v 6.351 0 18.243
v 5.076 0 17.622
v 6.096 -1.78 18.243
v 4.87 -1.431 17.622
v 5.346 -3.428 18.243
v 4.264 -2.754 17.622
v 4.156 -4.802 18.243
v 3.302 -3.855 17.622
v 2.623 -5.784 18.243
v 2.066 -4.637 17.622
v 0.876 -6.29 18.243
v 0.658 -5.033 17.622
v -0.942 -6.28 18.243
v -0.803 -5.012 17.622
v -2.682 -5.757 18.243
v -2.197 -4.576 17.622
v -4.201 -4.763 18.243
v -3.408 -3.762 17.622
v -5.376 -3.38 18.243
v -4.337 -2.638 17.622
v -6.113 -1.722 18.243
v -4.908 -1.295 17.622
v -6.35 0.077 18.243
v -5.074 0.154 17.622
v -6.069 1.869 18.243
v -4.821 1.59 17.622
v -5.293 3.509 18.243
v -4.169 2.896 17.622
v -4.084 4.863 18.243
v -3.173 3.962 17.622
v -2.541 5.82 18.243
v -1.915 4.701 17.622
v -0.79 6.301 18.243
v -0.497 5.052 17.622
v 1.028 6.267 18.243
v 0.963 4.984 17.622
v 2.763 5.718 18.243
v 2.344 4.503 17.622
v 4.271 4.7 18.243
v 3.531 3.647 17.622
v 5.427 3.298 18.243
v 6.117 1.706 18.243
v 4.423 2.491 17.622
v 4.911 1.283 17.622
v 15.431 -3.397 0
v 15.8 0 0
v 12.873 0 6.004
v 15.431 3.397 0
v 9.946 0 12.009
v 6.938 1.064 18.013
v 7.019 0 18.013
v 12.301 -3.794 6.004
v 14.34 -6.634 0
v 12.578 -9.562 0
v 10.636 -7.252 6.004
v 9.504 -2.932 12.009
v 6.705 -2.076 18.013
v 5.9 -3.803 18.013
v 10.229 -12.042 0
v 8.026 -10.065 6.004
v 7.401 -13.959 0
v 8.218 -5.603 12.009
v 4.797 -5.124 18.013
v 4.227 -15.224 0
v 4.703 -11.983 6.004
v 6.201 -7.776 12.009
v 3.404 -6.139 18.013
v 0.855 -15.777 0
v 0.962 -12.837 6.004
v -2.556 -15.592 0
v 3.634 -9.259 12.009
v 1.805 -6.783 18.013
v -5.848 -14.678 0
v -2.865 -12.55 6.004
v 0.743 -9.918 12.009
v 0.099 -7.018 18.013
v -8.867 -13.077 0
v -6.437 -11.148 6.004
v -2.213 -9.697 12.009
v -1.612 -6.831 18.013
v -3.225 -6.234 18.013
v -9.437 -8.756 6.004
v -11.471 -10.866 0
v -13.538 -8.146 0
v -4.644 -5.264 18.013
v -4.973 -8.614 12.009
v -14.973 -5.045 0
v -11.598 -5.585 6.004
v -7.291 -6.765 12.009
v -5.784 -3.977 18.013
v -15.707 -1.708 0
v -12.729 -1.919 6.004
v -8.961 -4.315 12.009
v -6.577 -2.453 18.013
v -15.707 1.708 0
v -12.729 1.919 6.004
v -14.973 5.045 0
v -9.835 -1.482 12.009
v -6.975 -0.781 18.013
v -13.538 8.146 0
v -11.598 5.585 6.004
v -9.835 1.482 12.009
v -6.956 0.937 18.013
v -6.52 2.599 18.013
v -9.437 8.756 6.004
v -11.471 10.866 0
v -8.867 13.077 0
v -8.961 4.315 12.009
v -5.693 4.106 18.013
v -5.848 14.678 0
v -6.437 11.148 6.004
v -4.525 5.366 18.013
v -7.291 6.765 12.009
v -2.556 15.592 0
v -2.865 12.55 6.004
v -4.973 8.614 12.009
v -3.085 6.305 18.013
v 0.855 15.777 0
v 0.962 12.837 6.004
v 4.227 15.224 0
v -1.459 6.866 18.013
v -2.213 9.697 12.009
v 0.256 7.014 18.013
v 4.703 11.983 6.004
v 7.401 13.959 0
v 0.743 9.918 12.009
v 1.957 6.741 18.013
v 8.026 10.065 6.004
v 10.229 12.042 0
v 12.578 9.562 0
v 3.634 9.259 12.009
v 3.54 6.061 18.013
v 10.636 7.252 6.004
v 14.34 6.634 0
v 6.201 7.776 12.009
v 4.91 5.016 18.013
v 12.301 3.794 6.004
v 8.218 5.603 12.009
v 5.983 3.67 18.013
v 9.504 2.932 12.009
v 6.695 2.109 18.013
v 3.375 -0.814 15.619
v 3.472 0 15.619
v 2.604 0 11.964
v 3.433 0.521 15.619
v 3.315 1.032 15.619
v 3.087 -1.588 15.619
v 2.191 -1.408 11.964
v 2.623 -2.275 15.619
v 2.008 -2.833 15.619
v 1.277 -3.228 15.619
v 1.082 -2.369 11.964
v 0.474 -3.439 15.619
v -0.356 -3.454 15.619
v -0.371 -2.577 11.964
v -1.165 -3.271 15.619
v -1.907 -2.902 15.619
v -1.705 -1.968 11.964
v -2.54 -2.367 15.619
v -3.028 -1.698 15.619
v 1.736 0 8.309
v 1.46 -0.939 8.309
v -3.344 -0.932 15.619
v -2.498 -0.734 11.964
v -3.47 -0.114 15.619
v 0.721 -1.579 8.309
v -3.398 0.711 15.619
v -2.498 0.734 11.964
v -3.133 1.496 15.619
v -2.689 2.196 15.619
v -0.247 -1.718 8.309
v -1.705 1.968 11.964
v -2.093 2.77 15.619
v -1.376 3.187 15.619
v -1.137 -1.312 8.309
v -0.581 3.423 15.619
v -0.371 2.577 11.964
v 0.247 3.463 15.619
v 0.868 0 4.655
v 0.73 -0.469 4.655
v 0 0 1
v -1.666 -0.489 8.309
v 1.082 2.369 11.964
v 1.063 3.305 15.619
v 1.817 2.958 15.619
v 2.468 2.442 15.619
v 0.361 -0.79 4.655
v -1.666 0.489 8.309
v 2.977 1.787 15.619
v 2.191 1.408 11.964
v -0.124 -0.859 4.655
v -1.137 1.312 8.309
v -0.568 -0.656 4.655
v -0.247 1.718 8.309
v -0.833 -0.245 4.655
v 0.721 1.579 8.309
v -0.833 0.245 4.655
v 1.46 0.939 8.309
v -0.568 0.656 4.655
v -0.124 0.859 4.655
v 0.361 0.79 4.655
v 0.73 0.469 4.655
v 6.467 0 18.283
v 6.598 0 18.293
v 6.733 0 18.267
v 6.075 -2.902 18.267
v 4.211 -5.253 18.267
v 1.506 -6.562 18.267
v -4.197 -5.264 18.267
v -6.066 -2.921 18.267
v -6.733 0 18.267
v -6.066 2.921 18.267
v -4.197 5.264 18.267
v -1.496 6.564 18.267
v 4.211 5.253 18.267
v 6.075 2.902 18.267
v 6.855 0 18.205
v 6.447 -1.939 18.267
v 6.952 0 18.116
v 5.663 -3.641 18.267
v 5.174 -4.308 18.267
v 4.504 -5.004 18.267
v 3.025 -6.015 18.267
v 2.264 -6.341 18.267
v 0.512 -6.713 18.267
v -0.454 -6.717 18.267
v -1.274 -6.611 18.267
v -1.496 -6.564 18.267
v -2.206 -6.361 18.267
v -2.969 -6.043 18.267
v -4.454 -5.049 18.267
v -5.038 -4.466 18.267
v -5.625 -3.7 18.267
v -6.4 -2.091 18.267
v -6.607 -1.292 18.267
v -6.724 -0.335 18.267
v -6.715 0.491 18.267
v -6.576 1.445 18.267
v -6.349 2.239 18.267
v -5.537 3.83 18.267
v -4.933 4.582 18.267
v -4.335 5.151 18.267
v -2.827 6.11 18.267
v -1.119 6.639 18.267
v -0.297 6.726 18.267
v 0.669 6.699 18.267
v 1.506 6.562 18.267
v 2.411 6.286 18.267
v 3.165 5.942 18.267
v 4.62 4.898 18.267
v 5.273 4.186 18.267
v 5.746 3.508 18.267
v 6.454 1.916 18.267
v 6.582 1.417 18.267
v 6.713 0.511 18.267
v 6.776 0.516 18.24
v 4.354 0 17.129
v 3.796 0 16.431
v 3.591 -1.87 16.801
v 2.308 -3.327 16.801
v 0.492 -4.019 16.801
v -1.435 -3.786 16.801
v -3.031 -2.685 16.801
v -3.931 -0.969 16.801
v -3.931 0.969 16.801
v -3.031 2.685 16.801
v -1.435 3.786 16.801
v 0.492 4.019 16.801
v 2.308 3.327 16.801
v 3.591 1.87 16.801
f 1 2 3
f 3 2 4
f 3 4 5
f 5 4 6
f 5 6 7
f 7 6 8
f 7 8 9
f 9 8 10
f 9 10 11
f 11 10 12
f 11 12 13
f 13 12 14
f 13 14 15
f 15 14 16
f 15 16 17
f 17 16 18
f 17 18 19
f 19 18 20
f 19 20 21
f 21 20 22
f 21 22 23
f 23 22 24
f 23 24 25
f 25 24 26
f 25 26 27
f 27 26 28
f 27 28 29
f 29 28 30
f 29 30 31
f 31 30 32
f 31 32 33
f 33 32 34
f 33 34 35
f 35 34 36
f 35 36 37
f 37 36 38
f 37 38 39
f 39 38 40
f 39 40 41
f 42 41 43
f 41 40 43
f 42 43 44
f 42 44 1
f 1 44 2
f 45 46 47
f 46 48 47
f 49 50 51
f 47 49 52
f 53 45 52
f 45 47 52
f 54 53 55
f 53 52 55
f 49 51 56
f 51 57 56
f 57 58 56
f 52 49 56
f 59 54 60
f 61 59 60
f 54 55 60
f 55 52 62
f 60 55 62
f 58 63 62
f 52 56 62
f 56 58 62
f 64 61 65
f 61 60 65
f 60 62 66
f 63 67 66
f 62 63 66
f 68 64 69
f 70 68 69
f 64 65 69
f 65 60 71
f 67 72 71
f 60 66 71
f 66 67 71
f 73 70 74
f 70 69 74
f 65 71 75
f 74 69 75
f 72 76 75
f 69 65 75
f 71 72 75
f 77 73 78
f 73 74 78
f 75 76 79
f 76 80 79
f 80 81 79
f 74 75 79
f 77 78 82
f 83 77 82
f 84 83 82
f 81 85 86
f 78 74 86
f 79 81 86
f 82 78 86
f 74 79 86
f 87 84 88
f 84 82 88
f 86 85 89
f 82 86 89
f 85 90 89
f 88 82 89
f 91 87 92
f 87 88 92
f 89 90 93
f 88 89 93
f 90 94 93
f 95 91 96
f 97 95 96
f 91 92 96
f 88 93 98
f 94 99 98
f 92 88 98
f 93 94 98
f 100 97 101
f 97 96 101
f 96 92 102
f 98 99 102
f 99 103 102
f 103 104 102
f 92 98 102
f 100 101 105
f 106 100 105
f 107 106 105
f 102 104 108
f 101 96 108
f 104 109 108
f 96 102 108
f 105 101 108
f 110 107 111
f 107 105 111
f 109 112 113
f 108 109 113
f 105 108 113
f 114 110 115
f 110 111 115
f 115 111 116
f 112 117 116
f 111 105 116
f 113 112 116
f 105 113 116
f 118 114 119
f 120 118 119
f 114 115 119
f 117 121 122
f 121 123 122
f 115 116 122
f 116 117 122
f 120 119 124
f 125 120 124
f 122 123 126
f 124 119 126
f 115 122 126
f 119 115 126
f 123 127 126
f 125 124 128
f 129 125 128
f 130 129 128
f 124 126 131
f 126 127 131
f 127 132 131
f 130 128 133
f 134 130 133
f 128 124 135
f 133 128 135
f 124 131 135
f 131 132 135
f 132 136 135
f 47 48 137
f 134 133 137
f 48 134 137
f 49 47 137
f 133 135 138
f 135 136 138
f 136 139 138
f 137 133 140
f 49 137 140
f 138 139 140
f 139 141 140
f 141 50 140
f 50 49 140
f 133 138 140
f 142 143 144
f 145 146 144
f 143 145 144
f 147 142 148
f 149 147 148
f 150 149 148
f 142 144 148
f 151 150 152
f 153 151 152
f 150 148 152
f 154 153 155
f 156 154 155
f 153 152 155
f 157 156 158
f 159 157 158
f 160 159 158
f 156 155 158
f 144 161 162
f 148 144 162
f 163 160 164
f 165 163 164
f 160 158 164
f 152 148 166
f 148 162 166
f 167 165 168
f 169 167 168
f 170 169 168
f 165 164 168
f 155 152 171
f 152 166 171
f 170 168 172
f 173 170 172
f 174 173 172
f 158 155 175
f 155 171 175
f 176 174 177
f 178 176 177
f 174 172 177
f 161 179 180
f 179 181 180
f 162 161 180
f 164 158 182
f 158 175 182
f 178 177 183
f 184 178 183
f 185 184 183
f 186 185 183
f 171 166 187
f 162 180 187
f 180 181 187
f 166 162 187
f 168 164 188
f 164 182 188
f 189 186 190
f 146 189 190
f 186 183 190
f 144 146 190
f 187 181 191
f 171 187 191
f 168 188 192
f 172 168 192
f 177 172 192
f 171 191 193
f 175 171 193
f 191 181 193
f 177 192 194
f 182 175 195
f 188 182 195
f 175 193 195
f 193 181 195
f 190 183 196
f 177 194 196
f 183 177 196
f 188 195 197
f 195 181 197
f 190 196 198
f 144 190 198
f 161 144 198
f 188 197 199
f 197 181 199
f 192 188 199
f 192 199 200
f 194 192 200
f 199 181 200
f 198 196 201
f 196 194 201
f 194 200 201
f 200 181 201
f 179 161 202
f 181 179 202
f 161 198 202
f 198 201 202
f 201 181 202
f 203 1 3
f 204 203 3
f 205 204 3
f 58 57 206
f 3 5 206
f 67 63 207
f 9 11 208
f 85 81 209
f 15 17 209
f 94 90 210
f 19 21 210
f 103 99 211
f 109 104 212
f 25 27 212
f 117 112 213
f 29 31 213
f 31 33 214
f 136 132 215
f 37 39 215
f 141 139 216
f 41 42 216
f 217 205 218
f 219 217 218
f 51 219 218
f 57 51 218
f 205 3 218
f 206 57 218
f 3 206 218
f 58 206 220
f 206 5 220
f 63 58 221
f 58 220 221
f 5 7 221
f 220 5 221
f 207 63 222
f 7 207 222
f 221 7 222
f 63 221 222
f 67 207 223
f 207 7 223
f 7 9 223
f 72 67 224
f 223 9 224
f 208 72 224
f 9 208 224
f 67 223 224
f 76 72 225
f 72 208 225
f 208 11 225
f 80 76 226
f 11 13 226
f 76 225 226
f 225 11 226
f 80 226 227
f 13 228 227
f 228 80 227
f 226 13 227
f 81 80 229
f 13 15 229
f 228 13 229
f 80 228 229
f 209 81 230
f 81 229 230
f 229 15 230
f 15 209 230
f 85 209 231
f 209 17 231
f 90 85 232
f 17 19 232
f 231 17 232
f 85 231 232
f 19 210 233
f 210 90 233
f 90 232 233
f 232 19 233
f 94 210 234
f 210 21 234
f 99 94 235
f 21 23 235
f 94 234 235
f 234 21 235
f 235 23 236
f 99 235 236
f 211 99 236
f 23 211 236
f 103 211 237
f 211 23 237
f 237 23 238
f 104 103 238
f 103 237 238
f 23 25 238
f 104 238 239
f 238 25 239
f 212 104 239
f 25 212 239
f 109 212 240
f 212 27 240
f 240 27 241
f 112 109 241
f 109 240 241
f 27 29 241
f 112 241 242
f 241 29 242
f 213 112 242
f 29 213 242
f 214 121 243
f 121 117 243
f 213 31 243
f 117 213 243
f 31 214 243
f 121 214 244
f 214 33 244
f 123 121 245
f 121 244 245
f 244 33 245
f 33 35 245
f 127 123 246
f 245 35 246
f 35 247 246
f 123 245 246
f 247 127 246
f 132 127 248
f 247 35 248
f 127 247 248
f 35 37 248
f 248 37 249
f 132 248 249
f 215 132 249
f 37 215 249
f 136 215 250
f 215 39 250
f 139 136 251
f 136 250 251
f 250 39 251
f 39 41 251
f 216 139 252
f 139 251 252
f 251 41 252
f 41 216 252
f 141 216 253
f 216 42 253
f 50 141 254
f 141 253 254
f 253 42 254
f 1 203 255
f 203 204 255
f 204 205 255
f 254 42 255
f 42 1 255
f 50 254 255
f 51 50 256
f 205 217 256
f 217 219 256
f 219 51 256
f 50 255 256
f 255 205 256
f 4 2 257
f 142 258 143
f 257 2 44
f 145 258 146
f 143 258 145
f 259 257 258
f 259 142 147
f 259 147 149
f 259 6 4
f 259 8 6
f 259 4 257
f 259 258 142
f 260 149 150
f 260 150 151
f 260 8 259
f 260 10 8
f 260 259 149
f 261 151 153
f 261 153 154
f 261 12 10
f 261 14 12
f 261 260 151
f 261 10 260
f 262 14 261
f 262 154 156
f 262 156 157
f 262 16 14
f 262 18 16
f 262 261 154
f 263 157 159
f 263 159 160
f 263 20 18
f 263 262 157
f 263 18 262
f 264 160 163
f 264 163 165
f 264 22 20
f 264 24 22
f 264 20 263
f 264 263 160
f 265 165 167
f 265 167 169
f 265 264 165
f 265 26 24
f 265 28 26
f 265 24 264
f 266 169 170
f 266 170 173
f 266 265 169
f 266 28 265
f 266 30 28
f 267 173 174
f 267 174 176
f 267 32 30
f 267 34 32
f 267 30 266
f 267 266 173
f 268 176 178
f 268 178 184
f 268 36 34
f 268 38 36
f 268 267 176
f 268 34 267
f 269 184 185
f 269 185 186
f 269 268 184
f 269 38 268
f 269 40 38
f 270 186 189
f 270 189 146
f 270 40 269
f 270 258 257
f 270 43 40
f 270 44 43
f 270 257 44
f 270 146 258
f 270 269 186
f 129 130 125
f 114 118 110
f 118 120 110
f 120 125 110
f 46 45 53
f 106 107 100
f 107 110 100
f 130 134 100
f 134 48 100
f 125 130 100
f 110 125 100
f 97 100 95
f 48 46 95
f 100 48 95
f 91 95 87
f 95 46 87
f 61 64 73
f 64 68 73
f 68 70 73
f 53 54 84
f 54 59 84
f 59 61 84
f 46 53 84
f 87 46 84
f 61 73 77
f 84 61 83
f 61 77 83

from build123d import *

# Parameters (mm, degrees)
F2_R = 3
F3_R = 0.5


with BuildPart() as f1:
    # F0 (on Front) → F1 (revolve)
    with BuildSketch(Plane.XZ):
        Polygon((0, 1), (0, 0), (15.8, 0), (6.8, 18.462429), (3.8, 17), align=None)
    revolve(axis=Axis((0, 0, 0.5), (0, 0, -1)))

    # F2
    f2_edges = [f1.edges().sort_by_distance(p)[0] for p in [
        (-3.8, 0, 17),
        (1.9, 0, 9),
    ]]
    fillet(f2_edges, radius=F2_R)

    # F3
    f3_edges = [f1.edges().sort_by_distance(p)[0] for p in [
        (-6.8, 0, 18.462429),
    ]]
    fillet(f3_edges, radius=F3_R)


solid = f1.part
